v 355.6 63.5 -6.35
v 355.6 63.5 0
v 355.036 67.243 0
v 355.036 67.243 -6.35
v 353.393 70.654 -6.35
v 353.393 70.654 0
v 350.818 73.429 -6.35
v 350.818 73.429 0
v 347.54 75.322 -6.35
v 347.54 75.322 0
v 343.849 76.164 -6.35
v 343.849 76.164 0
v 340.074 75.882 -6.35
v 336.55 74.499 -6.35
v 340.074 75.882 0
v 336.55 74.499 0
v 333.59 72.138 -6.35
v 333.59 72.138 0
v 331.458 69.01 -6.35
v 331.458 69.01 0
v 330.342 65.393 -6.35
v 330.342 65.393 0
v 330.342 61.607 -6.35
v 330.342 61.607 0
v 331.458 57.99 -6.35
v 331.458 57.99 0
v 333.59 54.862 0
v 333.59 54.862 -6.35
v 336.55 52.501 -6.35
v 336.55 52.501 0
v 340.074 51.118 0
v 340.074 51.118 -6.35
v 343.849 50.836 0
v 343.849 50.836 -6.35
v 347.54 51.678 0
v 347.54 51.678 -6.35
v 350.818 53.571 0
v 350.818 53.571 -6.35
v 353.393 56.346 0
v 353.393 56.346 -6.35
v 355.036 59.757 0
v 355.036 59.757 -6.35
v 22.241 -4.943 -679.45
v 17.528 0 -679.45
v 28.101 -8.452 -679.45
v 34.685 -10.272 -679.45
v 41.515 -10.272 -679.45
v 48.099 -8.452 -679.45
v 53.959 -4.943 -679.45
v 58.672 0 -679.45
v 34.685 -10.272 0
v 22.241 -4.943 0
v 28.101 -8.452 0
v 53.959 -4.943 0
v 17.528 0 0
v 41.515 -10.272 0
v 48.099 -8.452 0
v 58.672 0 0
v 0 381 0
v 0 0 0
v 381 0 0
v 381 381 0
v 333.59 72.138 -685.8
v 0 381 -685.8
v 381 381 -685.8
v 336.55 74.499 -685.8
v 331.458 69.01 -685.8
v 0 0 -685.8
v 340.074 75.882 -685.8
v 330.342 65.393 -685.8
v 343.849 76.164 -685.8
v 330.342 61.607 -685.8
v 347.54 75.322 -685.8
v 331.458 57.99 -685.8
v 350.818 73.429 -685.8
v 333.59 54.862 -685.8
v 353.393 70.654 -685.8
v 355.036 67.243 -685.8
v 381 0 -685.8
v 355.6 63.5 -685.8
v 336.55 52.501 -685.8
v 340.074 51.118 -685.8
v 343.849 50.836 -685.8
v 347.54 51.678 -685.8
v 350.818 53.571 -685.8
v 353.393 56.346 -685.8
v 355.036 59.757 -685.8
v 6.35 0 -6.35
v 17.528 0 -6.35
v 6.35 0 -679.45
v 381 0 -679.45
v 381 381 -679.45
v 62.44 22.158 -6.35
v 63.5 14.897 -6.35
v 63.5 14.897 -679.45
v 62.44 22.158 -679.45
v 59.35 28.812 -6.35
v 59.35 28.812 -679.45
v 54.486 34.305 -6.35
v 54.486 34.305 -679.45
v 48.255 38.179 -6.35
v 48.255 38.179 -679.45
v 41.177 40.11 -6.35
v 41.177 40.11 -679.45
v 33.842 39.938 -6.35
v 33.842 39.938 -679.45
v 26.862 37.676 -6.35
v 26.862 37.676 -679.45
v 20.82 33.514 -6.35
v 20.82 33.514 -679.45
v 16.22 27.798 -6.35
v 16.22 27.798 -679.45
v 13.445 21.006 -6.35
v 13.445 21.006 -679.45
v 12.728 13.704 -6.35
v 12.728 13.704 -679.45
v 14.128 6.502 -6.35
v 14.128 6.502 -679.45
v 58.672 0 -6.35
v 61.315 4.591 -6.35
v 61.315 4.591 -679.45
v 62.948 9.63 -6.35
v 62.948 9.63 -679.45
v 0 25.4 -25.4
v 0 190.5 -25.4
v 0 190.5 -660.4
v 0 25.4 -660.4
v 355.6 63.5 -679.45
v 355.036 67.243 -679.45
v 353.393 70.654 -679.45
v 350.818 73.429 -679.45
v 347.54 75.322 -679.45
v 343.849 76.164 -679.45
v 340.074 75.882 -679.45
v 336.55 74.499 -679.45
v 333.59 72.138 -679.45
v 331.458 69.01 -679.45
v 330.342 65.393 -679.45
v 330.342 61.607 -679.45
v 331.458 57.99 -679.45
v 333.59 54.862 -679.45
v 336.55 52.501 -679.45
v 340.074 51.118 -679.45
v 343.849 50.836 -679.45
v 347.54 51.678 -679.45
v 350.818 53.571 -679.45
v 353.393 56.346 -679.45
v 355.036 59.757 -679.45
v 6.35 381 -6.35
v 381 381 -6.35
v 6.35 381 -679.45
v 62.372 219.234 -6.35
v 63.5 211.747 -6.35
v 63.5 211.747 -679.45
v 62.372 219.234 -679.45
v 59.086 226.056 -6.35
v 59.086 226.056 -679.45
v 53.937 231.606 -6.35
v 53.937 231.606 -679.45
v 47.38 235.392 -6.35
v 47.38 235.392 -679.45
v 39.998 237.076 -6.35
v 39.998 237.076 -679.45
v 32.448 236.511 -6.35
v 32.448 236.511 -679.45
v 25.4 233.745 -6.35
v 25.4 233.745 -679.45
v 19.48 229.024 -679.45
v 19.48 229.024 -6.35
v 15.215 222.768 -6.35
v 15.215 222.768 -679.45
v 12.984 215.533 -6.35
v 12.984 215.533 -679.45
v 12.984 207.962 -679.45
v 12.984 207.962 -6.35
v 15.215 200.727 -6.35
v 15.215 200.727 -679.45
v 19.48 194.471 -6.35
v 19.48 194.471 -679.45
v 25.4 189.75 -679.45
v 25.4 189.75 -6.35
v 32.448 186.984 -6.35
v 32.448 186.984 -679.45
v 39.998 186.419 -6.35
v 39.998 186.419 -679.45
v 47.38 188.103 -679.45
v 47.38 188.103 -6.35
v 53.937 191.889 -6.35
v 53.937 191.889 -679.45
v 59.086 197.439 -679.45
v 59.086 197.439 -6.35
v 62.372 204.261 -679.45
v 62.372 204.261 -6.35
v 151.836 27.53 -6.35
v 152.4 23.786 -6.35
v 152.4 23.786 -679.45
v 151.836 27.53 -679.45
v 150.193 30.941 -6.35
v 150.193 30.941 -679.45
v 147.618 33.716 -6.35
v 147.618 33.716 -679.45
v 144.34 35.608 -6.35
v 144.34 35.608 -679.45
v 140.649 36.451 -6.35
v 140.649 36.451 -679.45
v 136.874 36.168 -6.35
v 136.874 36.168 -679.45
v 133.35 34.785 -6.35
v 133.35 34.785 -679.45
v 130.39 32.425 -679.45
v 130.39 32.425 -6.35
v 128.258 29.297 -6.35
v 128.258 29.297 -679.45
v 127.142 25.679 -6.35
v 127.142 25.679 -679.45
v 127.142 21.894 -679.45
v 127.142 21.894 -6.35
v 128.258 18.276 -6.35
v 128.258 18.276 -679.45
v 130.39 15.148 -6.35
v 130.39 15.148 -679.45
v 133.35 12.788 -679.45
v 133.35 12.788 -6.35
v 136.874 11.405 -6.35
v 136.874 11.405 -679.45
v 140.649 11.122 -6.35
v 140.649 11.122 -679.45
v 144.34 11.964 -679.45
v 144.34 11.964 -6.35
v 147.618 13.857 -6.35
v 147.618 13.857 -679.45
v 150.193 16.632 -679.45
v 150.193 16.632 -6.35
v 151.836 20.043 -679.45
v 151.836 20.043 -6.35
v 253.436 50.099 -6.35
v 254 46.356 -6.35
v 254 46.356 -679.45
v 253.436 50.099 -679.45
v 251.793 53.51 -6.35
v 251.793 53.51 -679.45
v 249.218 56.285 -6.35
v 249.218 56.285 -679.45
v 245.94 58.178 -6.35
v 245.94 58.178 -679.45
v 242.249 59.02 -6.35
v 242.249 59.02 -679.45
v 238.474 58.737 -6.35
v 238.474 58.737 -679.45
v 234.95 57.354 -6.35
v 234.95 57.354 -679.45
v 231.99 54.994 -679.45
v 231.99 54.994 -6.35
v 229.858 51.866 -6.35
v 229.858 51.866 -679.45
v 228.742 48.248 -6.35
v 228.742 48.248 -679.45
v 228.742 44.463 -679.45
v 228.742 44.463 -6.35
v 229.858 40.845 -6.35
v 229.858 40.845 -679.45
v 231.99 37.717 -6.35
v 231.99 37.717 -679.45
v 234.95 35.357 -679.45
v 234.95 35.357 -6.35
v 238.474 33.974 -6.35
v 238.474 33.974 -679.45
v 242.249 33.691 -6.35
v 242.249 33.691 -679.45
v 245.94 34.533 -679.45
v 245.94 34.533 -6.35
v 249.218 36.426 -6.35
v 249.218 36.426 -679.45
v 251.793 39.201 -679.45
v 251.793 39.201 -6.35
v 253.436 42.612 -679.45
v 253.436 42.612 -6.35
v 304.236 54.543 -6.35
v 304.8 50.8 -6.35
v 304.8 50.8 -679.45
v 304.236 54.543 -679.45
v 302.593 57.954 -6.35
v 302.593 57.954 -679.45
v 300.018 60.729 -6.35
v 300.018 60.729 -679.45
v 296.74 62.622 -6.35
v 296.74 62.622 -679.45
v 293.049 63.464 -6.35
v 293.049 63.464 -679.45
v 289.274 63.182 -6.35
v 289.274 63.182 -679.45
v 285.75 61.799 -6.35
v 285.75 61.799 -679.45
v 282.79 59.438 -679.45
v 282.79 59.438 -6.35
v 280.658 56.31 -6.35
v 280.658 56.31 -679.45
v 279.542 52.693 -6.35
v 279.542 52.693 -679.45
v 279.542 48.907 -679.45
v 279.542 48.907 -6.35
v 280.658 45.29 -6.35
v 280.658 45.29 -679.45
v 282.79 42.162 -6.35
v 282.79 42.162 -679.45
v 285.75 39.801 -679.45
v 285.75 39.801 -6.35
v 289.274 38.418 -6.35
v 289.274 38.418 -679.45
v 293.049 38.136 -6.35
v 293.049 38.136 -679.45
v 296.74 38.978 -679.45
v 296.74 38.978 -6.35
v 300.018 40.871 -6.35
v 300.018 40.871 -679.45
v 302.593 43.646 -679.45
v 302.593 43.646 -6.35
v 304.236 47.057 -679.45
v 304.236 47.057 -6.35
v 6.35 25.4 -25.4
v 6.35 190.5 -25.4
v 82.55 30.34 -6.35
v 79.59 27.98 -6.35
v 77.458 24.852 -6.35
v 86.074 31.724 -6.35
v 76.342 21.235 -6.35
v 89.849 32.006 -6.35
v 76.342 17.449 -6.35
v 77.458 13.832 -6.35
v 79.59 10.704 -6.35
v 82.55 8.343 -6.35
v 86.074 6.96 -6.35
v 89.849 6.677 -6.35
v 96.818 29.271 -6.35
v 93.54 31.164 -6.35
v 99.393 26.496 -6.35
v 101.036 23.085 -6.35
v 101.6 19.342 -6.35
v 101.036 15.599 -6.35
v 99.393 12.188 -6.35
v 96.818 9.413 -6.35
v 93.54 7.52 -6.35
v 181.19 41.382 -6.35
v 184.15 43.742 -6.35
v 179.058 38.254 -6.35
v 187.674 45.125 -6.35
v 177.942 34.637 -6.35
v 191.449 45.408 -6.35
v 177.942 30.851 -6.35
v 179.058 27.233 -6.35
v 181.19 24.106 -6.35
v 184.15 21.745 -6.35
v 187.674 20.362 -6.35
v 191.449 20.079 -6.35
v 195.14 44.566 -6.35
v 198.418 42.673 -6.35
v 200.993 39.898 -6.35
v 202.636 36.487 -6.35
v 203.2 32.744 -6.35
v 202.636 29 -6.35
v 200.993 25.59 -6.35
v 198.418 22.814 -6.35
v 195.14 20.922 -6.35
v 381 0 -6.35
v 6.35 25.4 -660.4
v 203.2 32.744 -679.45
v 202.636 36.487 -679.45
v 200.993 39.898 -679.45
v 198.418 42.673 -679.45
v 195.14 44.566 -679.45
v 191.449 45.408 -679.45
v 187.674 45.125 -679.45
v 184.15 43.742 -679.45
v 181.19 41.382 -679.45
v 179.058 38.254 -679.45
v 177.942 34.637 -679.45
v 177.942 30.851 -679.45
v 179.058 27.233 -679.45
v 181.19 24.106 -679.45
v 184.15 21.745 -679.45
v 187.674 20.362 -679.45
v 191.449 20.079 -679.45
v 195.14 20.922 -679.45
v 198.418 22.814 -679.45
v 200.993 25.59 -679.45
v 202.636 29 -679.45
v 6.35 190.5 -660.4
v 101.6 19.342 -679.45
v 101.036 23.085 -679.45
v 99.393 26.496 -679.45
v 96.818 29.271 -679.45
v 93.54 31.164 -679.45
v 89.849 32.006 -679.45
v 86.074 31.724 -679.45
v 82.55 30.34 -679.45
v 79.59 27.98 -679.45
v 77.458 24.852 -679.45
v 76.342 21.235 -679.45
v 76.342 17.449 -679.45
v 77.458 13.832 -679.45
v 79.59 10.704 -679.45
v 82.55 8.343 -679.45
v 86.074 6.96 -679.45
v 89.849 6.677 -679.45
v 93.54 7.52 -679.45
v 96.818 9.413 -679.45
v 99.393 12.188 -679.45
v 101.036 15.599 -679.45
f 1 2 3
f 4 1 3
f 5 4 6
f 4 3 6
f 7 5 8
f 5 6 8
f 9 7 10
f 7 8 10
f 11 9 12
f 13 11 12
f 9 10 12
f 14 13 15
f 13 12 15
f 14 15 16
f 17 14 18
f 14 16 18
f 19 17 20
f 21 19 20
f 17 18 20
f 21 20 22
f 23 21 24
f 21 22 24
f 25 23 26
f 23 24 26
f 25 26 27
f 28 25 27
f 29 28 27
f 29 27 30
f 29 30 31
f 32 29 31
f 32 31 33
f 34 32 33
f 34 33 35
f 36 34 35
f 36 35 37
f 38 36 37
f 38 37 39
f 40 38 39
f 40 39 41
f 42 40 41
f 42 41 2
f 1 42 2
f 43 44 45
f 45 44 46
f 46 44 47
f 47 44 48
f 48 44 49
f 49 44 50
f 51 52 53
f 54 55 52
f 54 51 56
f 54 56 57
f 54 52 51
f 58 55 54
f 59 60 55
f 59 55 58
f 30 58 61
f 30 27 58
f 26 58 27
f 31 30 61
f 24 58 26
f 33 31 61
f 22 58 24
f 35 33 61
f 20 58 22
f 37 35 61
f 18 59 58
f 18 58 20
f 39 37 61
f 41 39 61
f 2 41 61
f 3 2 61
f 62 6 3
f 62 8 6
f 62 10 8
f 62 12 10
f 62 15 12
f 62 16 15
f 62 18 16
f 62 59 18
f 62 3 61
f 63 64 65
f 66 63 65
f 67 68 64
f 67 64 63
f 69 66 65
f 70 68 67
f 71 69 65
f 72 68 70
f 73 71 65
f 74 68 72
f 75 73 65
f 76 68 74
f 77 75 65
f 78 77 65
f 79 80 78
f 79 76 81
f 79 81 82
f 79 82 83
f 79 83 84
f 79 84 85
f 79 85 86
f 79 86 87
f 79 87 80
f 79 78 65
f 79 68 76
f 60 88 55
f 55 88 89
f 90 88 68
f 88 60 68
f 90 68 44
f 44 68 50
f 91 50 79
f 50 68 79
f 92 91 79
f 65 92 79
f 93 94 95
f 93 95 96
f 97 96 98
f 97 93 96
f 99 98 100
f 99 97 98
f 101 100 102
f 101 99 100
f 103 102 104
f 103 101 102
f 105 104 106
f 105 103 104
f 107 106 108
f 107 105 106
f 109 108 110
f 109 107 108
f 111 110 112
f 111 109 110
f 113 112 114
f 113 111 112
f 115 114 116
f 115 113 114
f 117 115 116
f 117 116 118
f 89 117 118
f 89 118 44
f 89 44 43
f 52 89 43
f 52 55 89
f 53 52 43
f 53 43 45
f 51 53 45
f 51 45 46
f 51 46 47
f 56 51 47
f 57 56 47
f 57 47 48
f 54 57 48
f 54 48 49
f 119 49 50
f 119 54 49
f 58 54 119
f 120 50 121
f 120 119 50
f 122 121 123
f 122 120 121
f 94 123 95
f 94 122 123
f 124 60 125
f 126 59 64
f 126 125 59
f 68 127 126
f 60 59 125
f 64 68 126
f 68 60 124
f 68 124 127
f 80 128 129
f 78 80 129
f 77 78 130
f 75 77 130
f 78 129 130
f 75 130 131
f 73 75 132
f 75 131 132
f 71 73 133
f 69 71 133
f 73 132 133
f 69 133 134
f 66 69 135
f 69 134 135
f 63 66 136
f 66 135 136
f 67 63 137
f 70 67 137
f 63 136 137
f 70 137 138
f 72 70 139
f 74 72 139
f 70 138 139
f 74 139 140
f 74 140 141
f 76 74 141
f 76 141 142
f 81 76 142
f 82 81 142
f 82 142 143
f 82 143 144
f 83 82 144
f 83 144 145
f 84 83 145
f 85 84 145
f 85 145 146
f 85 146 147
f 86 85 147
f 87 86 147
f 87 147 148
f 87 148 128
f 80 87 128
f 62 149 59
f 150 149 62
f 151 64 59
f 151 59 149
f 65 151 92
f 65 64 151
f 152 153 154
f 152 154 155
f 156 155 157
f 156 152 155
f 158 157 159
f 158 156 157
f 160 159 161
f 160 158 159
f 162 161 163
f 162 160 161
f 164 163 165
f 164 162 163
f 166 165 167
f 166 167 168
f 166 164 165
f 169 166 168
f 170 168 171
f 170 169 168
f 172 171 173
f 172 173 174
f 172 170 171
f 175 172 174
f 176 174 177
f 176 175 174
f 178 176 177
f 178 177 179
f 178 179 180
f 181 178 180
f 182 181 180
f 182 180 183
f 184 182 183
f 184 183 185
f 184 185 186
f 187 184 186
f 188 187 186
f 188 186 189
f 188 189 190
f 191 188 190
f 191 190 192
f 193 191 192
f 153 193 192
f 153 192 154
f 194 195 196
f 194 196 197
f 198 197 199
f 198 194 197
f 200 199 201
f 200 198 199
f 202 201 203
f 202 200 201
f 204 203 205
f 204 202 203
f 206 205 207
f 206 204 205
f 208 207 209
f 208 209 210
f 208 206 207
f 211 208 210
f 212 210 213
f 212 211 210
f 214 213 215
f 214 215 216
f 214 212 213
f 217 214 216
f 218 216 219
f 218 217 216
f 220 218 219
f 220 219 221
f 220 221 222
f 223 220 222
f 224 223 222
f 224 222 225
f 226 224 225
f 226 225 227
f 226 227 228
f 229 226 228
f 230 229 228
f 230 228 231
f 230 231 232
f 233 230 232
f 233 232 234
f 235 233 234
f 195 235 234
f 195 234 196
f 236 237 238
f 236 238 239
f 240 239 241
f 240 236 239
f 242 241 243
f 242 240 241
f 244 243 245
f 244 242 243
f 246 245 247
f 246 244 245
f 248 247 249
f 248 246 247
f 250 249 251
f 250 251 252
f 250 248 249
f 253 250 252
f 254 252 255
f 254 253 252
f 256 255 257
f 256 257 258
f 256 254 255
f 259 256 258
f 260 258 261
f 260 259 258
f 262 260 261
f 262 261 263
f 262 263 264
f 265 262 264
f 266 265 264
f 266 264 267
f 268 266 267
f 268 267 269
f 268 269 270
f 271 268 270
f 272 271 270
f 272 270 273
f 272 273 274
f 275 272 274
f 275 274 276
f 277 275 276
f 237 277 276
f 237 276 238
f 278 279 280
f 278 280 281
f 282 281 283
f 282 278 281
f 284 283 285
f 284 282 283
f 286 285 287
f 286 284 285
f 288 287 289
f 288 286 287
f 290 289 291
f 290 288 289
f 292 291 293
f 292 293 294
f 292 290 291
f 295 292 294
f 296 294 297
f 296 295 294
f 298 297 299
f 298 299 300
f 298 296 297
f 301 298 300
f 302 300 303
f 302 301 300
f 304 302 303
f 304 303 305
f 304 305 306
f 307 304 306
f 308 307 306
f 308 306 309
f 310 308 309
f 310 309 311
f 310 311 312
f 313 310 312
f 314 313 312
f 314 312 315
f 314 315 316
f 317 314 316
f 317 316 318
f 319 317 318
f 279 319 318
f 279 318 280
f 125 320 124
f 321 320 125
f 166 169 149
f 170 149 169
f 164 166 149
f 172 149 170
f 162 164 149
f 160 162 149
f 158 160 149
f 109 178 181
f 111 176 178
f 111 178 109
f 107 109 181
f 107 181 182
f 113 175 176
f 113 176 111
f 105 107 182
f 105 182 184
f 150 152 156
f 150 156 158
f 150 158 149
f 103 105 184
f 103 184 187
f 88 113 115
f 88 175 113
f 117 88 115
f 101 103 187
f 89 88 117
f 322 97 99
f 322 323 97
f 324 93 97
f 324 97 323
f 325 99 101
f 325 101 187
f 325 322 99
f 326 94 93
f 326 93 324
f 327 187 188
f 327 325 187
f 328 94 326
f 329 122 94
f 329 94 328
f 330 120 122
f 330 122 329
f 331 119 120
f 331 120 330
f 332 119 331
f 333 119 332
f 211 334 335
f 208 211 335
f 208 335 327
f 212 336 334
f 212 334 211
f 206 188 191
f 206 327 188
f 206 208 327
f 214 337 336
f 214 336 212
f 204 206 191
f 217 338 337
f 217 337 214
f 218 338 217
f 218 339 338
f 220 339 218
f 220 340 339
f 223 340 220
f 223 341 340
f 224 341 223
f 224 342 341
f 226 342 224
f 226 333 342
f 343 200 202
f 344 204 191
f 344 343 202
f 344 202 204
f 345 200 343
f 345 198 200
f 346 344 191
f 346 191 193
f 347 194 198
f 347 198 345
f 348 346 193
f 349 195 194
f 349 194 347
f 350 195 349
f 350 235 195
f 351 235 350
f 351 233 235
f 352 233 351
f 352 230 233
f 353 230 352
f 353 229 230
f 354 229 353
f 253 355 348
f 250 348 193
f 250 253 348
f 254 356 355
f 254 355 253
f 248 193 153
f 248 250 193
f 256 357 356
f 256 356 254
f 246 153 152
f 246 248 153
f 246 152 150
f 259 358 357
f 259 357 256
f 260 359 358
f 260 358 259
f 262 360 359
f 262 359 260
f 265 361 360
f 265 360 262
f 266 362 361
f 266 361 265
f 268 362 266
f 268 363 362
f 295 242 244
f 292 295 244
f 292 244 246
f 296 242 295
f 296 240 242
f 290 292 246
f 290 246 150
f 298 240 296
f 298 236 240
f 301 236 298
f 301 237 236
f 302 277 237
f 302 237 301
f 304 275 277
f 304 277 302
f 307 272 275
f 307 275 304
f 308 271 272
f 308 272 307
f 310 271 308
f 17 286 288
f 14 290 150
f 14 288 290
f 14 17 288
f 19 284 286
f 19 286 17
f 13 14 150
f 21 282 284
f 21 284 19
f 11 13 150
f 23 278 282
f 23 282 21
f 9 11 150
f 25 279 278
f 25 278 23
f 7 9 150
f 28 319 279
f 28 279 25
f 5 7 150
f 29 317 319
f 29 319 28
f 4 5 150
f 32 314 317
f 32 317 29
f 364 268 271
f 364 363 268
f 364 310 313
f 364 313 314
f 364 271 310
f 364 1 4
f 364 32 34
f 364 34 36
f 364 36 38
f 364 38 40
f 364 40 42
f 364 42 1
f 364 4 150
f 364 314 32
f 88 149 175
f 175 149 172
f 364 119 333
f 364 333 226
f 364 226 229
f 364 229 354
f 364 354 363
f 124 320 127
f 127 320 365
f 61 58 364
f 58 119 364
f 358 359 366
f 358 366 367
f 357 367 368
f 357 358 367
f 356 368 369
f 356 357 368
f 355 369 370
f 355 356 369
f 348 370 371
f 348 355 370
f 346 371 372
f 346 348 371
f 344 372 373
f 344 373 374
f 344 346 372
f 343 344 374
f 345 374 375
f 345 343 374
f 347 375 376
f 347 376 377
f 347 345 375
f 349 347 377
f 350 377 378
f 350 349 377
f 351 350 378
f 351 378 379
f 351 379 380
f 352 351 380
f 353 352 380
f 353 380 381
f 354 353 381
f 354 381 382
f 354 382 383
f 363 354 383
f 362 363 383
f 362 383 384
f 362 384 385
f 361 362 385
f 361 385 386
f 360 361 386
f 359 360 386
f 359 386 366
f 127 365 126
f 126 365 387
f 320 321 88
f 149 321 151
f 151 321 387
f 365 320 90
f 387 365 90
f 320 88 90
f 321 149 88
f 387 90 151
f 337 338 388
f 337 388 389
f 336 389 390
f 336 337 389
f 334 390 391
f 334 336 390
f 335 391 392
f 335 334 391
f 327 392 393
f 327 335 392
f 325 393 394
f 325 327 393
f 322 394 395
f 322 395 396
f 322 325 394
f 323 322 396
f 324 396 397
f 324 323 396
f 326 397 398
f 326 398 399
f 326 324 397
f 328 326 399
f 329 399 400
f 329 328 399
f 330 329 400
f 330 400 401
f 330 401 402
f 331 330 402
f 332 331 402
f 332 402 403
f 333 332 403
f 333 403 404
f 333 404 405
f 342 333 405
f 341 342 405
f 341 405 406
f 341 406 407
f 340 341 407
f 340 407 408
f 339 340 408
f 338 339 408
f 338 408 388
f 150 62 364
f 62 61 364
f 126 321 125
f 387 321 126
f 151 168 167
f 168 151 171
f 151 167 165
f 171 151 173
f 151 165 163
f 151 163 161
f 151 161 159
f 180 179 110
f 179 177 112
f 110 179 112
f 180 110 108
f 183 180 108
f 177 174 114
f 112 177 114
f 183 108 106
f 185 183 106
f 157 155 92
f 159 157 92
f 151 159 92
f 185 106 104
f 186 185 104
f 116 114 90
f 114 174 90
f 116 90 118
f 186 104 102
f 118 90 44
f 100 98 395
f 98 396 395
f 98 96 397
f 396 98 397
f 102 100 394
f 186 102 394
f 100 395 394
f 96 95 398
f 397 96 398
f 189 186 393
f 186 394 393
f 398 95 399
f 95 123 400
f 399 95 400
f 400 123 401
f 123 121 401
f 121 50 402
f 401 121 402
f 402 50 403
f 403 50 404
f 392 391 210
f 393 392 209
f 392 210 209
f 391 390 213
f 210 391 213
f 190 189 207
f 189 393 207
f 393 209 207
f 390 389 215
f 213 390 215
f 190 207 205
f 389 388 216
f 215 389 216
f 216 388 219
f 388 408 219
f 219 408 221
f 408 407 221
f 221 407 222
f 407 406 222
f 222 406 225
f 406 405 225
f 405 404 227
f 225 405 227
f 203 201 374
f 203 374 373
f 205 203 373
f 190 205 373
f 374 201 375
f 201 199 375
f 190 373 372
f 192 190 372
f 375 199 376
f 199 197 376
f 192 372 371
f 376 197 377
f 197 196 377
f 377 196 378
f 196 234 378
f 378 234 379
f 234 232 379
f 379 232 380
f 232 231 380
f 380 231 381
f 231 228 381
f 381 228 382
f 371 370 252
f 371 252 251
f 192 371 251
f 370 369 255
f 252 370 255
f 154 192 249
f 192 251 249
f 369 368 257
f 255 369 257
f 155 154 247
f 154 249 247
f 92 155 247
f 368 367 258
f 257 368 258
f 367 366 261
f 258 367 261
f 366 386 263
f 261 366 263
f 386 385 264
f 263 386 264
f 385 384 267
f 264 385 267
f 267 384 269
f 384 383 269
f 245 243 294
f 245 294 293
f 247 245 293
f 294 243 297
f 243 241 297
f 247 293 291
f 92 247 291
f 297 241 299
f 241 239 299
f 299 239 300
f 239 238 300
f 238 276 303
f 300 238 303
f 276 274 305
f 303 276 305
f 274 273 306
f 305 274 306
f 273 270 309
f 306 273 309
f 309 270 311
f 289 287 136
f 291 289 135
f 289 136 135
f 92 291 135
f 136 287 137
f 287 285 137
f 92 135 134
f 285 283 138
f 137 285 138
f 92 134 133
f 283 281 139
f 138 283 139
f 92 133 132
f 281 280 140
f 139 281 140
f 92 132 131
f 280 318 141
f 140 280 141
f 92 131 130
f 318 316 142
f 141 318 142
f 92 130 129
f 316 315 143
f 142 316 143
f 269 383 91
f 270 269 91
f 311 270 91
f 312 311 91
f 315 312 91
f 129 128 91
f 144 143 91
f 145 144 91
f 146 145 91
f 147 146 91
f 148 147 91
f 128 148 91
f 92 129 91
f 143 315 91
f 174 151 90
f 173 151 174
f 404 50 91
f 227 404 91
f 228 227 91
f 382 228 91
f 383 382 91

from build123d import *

# Parameters (mm, degrees)
SKETCH1_W               = 381
SKETCH1_H               = 685.8
BOSS_EXTRUDE1_DEPTH     = 381
SHELL1_T                = -6.35
SKETCH4_R               = 12.7
CUT_EXTRUDE1_DEPTH      = 1
CUT_EXTRUDE1_DEPTH_BACK = 686.8
SKETCH5_R               = 12.7
BOSS_EXTRUDE3_DEPTH     = 679.45
SKETCH6_R               = 25.4
BOSS_EXTRUDE4_DEPTH     = 679.45
CUT_EXTRUDE3_REACH      = 8.35
SKETCH7_W               = 635
SKETCH7_H               = 165.1


with BuildPart() as part:
    # Sketch1 → Boss-Extrude1 (new body)
    with BuildSketch(Plane(origin=(0, 0, 0), x_dir=(1, 0, 0), z_dir=(0, 1, 0))):
        with Locations((190.5, 342.9)):
            Rectangle(SKETCH1_W, SKETCH1_H)
    extrude(amount=BOSS_EXTRUDE1_DEPTH)

    # Shell1
    shell1_openings = [part.faces().sort_by_distance(p)[0] for p in [
        (190.5, 381, -342.9),
        (190.5, 0, -342.9),
        (381, 190.5, -342.9),
    ]]
    offset(amount=SHELL1_T, openings=shell1_openings, kind=Kind.INTERSECTION)

    # Sketch4 → Cut-Extrude1 (cut, two sides)
    with BuildSketch(Plane.XY) as cut_extrude1_sk:
        with Locations((342.9, 63.5)):
            Circle(SKETCH4_R)
    extrude(amount=CUT_EXTRUDE1_DEPTH, mode=Mode.SUBTRACT)
    extrude(cut_extrude1_sk.sketch, amount=-CUT_EXTRUDE1_DEPTH_BACK, mode=Mode.SUBTRACT)

    # Sketch5 → Boss-Extrude3 (add)
    with BuildSketch(Plane.XY):
        with Locations((292.1, 50.8)):
            Circle(SKETCH5_R)
        with Locations((190.5, 32.743756917)):
            Circle(SKETCH5_R)
        with Locations((88.9, 19.34192219)):
            Circle(SKETCH5_R)
        with Locations((241.3, 46.355575893)):
            Circle(SKETCH5_R)
        with Locations((139.7, 23.786346297)):
            Circle(SKETCH5_R)
    extrude(amount=-BOSS_EXTRUDE3_DEPTH)

    # Sketch6 → Boss-Extrude4 (add)
    with BuildSketch(Plane.XY):
        with Locations((38.1, 14.897498083)):
            Circle(SKETCH6_R)
        with Locations((38.1, 211.747498083)):
            Circle(SKETCH6_R)
    extrude(amount=-BOSS_EXTRUDE4_DEPTH)

    # Sketch7 → Cut-Extrude3 (cut, up to next)
    with BuildSketch(Plane(origin=(6.35, 0, 0), x_dir=(0, 0, -1), z_dir=(1, 0, 0)), mode=Mode.PRIVATE) as cut_extrude3_sk1:
        with Locations((342.9, 107.95)):
            Rectangle(SKETCH7_W, SKETCH7_H)
    cut_extrude3_tool1 = extrude(cut_extrude3_sk1.sketch, amount=-CUT_EXTRUDE3_REACH, mode=Mode.PRIVATE) & part.part
    add(cut_extrude3_tool1.solids().sort_by_distance((6.35, 107.95, -342.9))[0], mode=Mode.SUBTRACT)


solid = part.part
